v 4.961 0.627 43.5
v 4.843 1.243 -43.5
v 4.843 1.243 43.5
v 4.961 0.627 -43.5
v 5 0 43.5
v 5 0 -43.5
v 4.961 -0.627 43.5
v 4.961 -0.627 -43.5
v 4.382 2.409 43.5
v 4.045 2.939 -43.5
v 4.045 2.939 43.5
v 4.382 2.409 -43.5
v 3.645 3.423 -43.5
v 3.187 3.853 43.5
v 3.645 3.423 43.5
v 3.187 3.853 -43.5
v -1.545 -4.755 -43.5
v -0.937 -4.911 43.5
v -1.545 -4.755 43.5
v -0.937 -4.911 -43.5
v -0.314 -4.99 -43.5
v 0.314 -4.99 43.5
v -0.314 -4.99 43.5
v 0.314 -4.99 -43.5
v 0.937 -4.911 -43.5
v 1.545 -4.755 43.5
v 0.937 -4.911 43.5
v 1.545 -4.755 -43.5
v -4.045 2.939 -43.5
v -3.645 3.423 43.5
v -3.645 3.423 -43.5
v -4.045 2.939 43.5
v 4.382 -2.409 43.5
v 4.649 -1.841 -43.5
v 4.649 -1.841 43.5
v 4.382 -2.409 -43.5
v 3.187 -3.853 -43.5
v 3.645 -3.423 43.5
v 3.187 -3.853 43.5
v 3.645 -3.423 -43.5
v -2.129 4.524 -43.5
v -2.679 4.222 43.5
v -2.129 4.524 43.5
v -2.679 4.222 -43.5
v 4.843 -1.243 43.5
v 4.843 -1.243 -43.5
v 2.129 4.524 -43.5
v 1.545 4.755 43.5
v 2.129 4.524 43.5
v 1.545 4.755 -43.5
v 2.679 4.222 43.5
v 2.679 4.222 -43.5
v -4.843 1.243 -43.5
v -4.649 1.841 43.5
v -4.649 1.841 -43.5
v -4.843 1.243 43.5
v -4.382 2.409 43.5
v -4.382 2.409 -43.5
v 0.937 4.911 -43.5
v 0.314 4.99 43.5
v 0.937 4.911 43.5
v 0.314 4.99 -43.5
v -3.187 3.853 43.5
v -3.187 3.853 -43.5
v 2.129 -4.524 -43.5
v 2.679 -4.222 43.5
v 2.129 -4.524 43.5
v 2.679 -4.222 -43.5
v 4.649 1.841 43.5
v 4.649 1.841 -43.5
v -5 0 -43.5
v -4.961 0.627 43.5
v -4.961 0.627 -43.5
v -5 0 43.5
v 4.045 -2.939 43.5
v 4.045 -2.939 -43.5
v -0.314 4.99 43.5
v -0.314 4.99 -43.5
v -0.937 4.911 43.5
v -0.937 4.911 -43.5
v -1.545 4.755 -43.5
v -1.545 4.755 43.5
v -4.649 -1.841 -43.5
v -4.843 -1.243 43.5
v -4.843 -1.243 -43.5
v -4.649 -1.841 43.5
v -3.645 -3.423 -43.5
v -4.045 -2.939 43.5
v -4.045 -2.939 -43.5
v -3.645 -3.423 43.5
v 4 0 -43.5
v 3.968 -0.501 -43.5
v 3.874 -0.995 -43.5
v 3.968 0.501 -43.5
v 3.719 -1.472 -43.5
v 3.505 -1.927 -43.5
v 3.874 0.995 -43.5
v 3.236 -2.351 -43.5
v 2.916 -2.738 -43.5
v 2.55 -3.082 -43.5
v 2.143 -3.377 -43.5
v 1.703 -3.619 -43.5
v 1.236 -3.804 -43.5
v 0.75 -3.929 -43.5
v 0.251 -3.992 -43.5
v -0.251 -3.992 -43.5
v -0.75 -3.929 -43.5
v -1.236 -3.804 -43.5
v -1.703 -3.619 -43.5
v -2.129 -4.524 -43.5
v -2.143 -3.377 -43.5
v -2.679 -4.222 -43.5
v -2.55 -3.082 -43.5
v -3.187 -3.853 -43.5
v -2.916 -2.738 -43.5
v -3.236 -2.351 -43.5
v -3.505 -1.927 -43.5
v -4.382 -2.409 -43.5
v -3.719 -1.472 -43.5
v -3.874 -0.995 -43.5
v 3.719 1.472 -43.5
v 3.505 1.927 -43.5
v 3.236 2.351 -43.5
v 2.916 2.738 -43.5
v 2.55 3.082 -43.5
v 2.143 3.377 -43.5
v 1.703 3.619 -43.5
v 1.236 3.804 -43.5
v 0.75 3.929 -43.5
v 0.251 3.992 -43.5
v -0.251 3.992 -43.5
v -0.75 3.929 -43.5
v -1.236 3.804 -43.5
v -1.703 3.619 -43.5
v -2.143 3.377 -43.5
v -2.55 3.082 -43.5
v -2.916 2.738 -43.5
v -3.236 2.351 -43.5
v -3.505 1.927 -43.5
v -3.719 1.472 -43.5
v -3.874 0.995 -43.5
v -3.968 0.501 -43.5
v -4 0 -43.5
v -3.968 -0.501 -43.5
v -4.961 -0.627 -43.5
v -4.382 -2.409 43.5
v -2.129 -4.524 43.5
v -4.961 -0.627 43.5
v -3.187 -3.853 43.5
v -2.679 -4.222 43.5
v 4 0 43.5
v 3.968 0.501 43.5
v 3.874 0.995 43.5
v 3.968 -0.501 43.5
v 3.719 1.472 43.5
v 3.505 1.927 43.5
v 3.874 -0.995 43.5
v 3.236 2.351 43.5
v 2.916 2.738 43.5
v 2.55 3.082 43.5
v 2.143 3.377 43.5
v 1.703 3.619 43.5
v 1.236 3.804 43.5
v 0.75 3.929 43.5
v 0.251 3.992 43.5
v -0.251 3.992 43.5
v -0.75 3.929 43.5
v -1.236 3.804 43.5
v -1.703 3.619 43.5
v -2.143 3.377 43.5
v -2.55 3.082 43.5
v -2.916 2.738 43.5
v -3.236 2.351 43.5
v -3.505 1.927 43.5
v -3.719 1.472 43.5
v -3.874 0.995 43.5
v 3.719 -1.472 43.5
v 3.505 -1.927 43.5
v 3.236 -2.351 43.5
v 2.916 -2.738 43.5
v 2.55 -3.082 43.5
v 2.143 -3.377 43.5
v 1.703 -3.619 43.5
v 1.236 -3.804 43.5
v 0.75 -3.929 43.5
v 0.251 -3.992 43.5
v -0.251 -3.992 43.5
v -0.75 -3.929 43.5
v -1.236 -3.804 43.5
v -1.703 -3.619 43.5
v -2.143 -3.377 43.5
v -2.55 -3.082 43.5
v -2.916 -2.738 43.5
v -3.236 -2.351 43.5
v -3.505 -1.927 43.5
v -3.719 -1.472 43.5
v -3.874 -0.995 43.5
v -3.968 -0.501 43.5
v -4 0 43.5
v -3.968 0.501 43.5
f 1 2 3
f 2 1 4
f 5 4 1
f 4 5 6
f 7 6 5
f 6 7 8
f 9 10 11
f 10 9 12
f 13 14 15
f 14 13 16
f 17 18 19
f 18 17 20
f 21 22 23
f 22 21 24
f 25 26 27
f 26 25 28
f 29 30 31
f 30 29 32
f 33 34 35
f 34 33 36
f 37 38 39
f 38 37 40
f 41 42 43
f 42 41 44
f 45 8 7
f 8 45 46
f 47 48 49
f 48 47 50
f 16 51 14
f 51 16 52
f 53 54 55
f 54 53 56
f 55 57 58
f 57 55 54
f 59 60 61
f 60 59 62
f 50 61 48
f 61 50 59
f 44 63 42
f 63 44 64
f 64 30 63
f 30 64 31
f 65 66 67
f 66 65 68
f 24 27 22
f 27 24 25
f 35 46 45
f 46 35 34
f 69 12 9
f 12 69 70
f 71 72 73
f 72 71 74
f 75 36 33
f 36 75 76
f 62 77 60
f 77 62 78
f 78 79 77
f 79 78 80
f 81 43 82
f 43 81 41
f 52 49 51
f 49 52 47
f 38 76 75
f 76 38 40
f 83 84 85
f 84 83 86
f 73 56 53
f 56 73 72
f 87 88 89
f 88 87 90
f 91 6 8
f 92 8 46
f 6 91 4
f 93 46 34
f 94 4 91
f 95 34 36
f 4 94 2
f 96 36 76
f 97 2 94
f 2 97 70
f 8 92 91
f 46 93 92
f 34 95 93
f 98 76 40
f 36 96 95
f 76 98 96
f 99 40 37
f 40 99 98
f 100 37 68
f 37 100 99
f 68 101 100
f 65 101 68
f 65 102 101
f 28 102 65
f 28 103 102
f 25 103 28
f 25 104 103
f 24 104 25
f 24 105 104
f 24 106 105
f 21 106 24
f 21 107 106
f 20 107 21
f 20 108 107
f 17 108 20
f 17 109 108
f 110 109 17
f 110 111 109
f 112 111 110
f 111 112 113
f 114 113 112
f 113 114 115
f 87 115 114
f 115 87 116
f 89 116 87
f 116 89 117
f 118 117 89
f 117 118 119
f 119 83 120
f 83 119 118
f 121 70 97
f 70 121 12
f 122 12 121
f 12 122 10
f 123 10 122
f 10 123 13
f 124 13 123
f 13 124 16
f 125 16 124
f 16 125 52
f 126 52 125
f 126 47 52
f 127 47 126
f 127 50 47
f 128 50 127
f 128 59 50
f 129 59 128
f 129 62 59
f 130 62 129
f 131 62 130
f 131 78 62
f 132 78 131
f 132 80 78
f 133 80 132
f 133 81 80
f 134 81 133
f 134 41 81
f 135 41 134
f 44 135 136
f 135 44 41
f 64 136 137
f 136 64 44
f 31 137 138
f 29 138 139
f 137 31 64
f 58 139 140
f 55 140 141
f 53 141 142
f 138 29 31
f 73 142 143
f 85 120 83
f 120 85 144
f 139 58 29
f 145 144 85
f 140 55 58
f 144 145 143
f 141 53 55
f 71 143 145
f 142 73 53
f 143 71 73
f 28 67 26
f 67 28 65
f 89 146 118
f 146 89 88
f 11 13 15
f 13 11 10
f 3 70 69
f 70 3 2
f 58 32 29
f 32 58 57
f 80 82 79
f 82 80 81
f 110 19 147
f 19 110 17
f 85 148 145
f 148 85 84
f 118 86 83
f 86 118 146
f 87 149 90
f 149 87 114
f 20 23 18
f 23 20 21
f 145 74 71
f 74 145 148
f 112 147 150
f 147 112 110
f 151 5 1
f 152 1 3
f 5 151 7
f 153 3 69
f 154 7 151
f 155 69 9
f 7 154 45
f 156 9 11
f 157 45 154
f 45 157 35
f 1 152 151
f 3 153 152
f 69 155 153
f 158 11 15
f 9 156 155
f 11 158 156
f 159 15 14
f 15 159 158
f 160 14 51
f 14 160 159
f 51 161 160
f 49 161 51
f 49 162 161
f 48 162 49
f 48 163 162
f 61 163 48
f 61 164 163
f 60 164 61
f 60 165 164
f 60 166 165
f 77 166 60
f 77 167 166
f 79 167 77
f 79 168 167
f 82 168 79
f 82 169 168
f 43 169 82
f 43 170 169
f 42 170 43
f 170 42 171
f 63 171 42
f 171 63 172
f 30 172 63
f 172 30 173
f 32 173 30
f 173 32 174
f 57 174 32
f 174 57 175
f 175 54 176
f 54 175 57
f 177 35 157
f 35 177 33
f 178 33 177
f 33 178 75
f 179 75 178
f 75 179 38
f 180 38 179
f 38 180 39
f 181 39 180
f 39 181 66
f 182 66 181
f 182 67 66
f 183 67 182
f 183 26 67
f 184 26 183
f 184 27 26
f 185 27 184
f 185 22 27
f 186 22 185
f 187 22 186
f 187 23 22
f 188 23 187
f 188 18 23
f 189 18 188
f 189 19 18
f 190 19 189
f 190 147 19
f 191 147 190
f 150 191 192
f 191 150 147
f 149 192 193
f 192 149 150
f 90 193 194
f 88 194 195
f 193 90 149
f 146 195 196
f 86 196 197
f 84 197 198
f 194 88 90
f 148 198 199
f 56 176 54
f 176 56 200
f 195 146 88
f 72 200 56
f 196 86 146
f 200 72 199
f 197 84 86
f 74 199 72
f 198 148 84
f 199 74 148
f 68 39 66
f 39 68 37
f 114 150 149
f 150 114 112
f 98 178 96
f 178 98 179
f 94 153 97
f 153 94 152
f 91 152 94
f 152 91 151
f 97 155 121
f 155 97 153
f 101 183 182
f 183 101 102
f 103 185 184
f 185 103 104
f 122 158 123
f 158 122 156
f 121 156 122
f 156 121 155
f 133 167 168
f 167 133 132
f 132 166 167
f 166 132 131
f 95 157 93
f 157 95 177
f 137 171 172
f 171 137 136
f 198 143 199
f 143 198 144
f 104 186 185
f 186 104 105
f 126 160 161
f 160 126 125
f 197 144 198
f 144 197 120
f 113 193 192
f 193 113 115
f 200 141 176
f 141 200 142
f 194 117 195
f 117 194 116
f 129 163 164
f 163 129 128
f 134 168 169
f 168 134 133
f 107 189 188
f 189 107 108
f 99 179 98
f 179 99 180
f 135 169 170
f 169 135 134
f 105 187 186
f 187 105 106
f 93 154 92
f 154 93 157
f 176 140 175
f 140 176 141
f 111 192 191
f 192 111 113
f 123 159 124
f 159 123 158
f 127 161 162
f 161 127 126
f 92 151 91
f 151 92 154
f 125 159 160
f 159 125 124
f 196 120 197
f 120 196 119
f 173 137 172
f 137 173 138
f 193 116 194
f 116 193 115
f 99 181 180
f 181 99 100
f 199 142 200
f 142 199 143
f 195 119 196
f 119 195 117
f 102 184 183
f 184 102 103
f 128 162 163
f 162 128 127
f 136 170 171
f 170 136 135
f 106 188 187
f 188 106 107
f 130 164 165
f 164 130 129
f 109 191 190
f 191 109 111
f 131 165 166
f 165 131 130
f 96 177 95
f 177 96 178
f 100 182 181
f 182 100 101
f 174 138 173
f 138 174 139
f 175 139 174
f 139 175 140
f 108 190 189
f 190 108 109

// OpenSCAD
$fn = 50;


difference() {
	union() {
		translate(v = [0, 0, -43.5000000000]) {
			cylinder(h = 87, r = 5.0000000000);
		}
	}
	union() {
		translate(v = [0, 0, -100.0000000000]) {
			cylinder(h = 200, r = 4.0000000000);
		}
	}
}
